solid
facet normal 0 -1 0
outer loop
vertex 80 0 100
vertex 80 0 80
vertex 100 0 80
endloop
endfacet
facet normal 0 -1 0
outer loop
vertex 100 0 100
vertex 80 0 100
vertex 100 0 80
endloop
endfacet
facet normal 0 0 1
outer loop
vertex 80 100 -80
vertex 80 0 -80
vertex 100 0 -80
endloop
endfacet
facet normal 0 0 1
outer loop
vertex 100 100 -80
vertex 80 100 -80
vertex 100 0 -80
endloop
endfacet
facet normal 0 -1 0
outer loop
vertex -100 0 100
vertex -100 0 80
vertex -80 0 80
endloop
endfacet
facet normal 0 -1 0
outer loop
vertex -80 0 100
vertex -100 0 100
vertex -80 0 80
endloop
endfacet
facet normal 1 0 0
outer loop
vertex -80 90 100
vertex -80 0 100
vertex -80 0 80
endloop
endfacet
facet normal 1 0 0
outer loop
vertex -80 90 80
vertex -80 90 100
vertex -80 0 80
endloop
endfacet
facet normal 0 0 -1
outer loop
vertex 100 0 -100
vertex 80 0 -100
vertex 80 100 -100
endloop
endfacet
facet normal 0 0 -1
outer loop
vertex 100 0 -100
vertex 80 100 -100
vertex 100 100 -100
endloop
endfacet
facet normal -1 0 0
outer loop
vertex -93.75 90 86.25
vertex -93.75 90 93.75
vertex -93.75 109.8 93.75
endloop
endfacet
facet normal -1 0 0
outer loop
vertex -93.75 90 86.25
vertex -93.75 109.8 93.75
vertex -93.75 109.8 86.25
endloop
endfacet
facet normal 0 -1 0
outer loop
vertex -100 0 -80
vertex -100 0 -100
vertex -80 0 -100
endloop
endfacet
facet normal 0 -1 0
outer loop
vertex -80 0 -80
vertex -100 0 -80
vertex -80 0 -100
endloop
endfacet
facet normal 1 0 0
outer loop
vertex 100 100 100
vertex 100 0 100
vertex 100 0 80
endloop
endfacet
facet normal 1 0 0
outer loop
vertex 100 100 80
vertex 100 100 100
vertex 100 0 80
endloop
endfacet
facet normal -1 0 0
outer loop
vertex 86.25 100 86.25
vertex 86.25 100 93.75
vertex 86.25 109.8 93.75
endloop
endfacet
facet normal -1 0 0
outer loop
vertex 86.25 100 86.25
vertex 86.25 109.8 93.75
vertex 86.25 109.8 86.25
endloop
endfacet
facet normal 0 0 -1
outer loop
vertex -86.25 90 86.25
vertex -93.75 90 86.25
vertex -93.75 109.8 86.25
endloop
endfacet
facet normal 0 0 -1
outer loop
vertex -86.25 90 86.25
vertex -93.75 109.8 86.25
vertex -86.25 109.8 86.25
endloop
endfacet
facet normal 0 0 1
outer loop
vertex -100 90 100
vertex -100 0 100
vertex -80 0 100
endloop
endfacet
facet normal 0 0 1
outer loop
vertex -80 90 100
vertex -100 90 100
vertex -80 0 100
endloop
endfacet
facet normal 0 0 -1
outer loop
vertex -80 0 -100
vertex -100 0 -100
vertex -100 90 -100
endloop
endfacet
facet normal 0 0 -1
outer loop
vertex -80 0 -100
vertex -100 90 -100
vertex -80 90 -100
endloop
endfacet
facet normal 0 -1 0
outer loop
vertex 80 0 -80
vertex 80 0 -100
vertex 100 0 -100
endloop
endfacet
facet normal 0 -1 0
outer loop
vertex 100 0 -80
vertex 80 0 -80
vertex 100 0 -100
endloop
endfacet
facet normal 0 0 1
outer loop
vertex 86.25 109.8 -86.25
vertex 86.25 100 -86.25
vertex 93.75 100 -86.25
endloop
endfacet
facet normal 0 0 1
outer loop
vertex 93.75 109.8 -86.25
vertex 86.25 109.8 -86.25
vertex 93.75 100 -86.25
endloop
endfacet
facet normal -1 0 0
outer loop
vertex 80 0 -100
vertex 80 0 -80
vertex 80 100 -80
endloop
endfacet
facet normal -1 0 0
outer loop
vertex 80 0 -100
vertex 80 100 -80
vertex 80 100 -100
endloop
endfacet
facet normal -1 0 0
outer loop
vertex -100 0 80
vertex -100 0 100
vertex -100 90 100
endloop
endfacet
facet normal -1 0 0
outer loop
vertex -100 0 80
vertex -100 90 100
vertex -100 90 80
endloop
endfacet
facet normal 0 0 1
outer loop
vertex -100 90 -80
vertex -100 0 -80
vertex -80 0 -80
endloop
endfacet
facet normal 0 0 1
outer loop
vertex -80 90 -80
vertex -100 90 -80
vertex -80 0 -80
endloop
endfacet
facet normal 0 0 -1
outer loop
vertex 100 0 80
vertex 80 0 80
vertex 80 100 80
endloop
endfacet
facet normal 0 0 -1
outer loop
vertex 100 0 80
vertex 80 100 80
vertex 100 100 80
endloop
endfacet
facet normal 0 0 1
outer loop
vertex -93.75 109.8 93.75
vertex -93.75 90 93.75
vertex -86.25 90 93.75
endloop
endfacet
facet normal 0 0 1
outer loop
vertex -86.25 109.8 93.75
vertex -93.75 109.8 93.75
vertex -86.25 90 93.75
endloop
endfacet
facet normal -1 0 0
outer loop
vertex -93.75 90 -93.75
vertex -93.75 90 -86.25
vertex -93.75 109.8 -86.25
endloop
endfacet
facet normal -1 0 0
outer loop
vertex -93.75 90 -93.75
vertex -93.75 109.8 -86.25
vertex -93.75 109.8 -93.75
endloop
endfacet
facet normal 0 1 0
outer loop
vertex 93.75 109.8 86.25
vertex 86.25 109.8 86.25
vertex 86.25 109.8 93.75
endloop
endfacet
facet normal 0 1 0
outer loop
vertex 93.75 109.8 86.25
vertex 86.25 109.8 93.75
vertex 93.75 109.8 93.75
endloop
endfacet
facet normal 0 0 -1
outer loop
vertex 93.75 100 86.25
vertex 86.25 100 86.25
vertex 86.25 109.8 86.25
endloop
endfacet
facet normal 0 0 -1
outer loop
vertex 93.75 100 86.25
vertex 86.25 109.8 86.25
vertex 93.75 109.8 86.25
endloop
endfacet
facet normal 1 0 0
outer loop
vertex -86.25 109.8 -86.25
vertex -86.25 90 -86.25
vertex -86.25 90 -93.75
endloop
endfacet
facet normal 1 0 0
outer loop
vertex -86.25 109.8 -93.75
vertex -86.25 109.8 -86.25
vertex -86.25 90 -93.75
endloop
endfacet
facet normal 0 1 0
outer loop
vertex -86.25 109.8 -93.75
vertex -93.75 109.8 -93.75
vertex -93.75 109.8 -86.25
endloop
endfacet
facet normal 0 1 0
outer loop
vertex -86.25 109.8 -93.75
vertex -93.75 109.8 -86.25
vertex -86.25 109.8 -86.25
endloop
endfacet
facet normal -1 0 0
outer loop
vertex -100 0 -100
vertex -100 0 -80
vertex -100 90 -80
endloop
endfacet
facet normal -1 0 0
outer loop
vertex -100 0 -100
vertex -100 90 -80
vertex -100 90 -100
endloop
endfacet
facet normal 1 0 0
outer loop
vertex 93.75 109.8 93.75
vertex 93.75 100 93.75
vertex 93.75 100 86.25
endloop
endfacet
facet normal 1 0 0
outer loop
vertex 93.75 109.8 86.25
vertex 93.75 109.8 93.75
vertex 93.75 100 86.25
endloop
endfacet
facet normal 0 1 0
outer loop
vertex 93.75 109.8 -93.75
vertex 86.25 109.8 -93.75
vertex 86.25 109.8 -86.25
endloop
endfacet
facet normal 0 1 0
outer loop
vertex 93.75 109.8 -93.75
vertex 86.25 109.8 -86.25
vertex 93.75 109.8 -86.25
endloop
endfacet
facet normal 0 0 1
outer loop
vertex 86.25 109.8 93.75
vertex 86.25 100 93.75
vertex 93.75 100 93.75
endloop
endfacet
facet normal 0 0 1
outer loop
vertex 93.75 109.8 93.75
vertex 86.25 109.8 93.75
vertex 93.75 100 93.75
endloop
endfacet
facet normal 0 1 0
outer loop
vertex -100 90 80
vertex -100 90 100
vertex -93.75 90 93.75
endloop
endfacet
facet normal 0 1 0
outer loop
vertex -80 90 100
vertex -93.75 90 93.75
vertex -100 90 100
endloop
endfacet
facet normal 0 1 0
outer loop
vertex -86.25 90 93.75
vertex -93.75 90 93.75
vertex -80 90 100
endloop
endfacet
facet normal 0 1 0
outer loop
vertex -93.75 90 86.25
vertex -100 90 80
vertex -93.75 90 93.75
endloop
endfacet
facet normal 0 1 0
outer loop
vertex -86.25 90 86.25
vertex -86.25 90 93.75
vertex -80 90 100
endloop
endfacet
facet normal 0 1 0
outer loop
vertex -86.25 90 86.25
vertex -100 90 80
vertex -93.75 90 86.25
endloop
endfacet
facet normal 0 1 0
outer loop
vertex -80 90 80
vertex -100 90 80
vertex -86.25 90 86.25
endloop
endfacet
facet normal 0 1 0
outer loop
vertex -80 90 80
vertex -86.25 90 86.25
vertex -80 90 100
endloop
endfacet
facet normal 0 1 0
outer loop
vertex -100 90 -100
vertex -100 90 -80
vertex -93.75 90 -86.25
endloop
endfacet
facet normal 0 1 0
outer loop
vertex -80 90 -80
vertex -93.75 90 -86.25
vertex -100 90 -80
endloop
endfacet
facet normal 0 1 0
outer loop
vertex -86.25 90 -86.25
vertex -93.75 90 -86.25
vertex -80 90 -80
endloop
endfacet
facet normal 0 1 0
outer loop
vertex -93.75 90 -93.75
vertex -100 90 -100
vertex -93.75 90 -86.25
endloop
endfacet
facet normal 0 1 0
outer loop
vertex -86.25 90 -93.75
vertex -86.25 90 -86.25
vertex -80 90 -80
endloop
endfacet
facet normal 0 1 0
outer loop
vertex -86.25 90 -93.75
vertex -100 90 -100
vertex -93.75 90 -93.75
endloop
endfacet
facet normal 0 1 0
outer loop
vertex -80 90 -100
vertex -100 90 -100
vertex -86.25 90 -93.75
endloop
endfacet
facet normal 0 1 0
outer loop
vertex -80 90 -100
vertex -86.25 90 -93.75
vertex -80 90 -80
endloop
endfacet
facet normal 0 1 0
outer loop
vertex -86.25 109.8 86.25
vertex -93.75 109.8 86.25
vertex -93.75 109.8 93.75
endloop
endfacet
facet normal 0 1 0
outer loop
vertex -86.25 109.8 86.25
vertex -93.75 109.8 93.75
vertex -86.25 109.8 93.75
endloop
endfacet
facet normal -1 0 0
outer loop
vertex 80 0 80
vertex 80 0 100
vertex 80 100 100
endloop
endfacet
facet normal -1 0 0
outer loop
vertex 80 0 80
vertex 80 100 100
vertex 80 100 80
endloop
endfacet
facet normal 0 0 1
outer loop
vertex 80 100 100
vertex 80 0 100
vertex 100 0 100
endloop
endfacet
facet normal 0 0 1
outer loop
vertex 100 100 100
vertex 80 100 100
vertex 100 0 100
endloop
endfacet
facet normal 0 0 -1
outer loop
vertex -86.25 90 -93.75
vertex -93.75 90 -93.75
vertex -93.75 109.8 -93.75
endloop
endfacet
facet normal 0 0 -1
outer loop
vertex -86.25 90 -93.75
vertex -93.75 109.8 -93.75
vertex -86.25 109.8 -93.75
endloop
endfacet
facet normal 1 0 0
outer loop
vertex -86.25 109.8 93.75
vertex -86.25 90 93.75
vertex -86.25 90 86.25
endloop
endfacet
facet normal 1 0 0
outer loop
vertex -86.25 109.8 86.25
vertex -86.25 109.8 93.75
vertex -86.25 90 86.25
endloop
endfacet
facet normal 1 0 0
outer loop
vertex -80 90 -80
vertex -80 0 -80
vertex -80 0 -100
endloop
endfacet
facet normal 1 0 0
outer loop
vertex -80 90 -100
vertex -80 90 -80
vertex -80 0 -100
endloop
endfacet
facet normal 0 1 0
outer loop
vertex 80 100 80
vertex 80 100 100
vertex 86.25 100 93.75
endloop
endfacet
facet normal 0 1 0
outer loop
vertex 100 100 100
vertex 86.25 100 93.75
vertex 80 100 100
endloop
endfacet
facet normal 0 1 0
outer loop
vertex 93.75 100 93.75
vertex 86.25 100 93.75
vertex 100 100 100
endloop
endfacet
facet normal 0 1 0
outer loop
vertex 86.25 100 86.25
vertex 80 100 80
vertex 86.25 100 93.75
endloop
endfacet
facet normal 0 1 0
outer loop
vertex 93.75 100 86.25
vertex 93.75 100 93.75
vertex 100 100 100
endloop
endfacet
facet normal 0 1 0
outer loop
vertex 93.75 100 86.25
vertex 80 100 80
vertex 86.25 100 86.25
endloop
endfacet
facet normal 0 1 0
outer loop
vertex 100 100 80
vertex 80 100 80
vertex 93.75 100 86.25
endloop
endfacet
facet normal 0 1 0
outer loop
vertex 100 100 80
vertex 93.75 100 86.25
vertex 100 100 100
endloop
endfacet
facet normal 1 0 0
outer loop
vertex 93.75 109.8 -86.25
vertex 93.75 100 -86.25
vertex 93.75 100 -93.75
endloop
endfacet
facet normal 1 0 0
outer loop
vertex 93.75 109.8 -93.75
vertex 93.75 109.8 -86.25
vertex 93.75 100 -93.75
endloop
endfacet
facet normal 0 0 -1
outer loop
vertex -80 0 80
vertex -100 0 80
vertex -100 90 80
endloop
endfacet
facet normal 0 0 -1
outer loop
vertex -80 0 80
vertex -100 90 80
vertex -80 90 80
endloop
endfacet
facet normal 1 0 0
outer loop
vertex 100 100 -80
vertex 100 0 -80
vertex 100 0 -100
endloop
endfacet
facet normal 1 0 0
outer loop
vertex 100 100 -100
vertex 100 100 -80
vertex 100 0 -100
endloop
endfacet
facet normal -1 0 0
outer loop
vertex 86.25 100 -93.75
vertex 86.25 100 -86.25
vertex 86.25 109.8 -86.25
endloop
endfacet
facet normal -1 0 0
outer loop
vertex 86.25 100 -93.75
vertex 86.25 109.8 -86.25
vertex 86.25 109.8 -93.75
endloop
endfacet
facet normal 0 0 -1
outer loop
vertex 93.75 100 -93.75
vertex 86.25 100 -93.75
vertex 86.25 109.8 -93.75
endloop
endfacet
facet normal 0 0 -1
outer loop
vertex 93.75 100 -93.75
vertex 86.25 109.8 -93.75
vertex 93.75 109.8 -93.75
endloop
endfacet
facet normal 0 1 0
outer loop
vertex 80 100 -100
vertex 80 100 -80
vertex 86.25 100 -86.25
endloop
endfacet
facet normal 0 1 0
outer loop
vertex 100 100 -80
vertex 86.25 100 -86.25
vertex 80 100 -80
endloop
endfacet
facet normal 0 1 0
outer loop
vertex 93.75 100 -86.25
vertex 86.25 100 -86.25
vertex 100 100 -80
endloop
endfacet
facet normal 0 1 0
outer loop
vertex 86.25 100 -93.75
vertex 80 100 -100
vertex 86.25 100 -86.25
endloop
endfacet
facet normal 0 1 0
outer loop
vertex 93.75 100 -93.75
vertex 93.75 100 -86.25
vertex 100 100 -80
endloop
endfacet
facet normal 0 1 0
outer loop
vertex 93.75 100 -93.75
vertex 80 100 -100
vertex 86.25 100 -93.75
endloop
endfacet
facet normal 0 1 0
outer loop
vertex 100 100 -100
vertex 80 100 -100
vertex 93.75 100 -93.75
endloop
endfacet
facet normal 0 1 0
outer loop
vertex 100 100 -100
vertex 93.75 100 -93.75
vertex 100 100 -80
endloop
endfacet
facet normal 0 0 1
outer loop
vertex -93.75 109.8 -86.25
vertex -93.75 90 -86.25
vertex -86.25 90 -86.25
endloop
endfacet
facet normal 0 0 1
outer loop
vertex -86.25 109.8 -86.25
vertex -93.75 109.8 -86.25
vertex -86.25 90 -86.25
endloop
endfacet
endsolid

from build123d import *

# Parameters (mm, degrees)
CROQUIS2_W                = 20
CROQUIS2_H                = 20
SALIENTE_EXTRUIR3_DEPTH   = 90
SALIENTE_EXTRUIR3_2_DEPTH = 90
CROQUIS5_W                = 20
CROQUIS5_H                = 20
SALIENTE_EXTRUIR4_DEPTH   = 100
SALIENTE_EXTRUIR4_2_DEPTH = 100
CROQUIS6_W                = 7.5
CROQUIS6_H                = 7.5
SALIENTE_EXTRUIR5_DEPTH   = 9.8
CROQUIS7_W                = 7.5
CROQUIS7_H                = 7.5
SALIENTE_EXTRUIR6_DEPTH   = 19.8


with BuildPart() as part:
    # Croquis2 → Saliente-Extruir3 (new body)
    with BuildSketch(Plane(origin=(0, 0, 0), x_dir=(1, 0, 0), z_dir=(0, 1, 0))):
        with Locations((-90, -90)):
            Rectangle(CROQUIS2_W, CROQUIS2_H)
    extrude(amount=SALIENTE_EXTRUIR3_DEPTH)



with BuildPart() as body_2:
    # Croquis2 → Saliente-Extruir3 2 (new body)
    with BuildSketch(Plane(origin=(0, 0, 0), x_dir=(1, 0, 0), z_dir=(0, 1, 0))):
        with Locations((-90, 90)):
            Rectangle(CROQUIS2_W, CROQUIS2_H)
    extrude(amount=SALIENTE_EXTRUIR3_2_DEPTH)


with BuildPart() as body_3:
    # Croquis5 → Saliente-Extruir4 (new body)
    with BuildSketch(Plane(origin=(0, 0, 0), x_dir=(1, 0, 0), z_dir=(0, 1, 0))):
        with Locations((90, -90)):
            Rectangle(CROQUIS5_W, CROQUIS5_H)
    extrude(amount=SALIENTE_EXTRUIR4_DEPTH)



with BuildPart() as body_4:
    # Croquis5 → Saliente-Extruir4 2 (new body)
    with BuildSketch(Plane(origin=(0, 0, 0), x_dir=(1, 0, 0), z_dir=(0, 1, 0))):
        with Locations((90, 90)):
            Rectangle(CROQUIS5_W, CROQUIS5_H)
    extrude(amount=SALIENTE_EXTRUIR4_2_DEPTH)


with BuildPart() as body_3_1:
    add(body_3.part)

    add(body_4.part)  # Saliente-Extruir5 merges body 4
    # Croquis6 → Saliente-Extruir5 (add)
    with BuildSketch(Plane(origin=(0, 100, 0), x_dir=(1, 0, 0), z_dir=(0, 1, 0))):
        with Locations((90, -90)):
            Rectangle(CROQUIS6_W, CROQUIS6_H)
        with Locations((90, 90)):
            Rectangle(CROQUIS6_W, CROQUIS6_H)
    extrude(amount=SALIENTE_EXTRUIR5_DEPTH)


with BuildPart() as part_1:
    add(part.part)

    add(body_2.part)  # Saliente-Extruir6 merges body 2
    # Croquis7 → Saliente-Extruir6 (add)
    with BuildSketch(Plane(origin=(0, 90, 0), x_dir=(1, 0, 0), z_dir=(0, 1, 0))):
        with Locations((-90, -90)):
            Rectangle(CROQUIS7_W, CROQUIS7_H)
        with Locations((-90, 90)):
            Rectangle(CROQUIS7_W, CROQUIS7_H)
    extrude(amount=SALIENTE_EXTRUIR6_DEPTH)


solid = Compound([body_3_1.part, part_1.part])
